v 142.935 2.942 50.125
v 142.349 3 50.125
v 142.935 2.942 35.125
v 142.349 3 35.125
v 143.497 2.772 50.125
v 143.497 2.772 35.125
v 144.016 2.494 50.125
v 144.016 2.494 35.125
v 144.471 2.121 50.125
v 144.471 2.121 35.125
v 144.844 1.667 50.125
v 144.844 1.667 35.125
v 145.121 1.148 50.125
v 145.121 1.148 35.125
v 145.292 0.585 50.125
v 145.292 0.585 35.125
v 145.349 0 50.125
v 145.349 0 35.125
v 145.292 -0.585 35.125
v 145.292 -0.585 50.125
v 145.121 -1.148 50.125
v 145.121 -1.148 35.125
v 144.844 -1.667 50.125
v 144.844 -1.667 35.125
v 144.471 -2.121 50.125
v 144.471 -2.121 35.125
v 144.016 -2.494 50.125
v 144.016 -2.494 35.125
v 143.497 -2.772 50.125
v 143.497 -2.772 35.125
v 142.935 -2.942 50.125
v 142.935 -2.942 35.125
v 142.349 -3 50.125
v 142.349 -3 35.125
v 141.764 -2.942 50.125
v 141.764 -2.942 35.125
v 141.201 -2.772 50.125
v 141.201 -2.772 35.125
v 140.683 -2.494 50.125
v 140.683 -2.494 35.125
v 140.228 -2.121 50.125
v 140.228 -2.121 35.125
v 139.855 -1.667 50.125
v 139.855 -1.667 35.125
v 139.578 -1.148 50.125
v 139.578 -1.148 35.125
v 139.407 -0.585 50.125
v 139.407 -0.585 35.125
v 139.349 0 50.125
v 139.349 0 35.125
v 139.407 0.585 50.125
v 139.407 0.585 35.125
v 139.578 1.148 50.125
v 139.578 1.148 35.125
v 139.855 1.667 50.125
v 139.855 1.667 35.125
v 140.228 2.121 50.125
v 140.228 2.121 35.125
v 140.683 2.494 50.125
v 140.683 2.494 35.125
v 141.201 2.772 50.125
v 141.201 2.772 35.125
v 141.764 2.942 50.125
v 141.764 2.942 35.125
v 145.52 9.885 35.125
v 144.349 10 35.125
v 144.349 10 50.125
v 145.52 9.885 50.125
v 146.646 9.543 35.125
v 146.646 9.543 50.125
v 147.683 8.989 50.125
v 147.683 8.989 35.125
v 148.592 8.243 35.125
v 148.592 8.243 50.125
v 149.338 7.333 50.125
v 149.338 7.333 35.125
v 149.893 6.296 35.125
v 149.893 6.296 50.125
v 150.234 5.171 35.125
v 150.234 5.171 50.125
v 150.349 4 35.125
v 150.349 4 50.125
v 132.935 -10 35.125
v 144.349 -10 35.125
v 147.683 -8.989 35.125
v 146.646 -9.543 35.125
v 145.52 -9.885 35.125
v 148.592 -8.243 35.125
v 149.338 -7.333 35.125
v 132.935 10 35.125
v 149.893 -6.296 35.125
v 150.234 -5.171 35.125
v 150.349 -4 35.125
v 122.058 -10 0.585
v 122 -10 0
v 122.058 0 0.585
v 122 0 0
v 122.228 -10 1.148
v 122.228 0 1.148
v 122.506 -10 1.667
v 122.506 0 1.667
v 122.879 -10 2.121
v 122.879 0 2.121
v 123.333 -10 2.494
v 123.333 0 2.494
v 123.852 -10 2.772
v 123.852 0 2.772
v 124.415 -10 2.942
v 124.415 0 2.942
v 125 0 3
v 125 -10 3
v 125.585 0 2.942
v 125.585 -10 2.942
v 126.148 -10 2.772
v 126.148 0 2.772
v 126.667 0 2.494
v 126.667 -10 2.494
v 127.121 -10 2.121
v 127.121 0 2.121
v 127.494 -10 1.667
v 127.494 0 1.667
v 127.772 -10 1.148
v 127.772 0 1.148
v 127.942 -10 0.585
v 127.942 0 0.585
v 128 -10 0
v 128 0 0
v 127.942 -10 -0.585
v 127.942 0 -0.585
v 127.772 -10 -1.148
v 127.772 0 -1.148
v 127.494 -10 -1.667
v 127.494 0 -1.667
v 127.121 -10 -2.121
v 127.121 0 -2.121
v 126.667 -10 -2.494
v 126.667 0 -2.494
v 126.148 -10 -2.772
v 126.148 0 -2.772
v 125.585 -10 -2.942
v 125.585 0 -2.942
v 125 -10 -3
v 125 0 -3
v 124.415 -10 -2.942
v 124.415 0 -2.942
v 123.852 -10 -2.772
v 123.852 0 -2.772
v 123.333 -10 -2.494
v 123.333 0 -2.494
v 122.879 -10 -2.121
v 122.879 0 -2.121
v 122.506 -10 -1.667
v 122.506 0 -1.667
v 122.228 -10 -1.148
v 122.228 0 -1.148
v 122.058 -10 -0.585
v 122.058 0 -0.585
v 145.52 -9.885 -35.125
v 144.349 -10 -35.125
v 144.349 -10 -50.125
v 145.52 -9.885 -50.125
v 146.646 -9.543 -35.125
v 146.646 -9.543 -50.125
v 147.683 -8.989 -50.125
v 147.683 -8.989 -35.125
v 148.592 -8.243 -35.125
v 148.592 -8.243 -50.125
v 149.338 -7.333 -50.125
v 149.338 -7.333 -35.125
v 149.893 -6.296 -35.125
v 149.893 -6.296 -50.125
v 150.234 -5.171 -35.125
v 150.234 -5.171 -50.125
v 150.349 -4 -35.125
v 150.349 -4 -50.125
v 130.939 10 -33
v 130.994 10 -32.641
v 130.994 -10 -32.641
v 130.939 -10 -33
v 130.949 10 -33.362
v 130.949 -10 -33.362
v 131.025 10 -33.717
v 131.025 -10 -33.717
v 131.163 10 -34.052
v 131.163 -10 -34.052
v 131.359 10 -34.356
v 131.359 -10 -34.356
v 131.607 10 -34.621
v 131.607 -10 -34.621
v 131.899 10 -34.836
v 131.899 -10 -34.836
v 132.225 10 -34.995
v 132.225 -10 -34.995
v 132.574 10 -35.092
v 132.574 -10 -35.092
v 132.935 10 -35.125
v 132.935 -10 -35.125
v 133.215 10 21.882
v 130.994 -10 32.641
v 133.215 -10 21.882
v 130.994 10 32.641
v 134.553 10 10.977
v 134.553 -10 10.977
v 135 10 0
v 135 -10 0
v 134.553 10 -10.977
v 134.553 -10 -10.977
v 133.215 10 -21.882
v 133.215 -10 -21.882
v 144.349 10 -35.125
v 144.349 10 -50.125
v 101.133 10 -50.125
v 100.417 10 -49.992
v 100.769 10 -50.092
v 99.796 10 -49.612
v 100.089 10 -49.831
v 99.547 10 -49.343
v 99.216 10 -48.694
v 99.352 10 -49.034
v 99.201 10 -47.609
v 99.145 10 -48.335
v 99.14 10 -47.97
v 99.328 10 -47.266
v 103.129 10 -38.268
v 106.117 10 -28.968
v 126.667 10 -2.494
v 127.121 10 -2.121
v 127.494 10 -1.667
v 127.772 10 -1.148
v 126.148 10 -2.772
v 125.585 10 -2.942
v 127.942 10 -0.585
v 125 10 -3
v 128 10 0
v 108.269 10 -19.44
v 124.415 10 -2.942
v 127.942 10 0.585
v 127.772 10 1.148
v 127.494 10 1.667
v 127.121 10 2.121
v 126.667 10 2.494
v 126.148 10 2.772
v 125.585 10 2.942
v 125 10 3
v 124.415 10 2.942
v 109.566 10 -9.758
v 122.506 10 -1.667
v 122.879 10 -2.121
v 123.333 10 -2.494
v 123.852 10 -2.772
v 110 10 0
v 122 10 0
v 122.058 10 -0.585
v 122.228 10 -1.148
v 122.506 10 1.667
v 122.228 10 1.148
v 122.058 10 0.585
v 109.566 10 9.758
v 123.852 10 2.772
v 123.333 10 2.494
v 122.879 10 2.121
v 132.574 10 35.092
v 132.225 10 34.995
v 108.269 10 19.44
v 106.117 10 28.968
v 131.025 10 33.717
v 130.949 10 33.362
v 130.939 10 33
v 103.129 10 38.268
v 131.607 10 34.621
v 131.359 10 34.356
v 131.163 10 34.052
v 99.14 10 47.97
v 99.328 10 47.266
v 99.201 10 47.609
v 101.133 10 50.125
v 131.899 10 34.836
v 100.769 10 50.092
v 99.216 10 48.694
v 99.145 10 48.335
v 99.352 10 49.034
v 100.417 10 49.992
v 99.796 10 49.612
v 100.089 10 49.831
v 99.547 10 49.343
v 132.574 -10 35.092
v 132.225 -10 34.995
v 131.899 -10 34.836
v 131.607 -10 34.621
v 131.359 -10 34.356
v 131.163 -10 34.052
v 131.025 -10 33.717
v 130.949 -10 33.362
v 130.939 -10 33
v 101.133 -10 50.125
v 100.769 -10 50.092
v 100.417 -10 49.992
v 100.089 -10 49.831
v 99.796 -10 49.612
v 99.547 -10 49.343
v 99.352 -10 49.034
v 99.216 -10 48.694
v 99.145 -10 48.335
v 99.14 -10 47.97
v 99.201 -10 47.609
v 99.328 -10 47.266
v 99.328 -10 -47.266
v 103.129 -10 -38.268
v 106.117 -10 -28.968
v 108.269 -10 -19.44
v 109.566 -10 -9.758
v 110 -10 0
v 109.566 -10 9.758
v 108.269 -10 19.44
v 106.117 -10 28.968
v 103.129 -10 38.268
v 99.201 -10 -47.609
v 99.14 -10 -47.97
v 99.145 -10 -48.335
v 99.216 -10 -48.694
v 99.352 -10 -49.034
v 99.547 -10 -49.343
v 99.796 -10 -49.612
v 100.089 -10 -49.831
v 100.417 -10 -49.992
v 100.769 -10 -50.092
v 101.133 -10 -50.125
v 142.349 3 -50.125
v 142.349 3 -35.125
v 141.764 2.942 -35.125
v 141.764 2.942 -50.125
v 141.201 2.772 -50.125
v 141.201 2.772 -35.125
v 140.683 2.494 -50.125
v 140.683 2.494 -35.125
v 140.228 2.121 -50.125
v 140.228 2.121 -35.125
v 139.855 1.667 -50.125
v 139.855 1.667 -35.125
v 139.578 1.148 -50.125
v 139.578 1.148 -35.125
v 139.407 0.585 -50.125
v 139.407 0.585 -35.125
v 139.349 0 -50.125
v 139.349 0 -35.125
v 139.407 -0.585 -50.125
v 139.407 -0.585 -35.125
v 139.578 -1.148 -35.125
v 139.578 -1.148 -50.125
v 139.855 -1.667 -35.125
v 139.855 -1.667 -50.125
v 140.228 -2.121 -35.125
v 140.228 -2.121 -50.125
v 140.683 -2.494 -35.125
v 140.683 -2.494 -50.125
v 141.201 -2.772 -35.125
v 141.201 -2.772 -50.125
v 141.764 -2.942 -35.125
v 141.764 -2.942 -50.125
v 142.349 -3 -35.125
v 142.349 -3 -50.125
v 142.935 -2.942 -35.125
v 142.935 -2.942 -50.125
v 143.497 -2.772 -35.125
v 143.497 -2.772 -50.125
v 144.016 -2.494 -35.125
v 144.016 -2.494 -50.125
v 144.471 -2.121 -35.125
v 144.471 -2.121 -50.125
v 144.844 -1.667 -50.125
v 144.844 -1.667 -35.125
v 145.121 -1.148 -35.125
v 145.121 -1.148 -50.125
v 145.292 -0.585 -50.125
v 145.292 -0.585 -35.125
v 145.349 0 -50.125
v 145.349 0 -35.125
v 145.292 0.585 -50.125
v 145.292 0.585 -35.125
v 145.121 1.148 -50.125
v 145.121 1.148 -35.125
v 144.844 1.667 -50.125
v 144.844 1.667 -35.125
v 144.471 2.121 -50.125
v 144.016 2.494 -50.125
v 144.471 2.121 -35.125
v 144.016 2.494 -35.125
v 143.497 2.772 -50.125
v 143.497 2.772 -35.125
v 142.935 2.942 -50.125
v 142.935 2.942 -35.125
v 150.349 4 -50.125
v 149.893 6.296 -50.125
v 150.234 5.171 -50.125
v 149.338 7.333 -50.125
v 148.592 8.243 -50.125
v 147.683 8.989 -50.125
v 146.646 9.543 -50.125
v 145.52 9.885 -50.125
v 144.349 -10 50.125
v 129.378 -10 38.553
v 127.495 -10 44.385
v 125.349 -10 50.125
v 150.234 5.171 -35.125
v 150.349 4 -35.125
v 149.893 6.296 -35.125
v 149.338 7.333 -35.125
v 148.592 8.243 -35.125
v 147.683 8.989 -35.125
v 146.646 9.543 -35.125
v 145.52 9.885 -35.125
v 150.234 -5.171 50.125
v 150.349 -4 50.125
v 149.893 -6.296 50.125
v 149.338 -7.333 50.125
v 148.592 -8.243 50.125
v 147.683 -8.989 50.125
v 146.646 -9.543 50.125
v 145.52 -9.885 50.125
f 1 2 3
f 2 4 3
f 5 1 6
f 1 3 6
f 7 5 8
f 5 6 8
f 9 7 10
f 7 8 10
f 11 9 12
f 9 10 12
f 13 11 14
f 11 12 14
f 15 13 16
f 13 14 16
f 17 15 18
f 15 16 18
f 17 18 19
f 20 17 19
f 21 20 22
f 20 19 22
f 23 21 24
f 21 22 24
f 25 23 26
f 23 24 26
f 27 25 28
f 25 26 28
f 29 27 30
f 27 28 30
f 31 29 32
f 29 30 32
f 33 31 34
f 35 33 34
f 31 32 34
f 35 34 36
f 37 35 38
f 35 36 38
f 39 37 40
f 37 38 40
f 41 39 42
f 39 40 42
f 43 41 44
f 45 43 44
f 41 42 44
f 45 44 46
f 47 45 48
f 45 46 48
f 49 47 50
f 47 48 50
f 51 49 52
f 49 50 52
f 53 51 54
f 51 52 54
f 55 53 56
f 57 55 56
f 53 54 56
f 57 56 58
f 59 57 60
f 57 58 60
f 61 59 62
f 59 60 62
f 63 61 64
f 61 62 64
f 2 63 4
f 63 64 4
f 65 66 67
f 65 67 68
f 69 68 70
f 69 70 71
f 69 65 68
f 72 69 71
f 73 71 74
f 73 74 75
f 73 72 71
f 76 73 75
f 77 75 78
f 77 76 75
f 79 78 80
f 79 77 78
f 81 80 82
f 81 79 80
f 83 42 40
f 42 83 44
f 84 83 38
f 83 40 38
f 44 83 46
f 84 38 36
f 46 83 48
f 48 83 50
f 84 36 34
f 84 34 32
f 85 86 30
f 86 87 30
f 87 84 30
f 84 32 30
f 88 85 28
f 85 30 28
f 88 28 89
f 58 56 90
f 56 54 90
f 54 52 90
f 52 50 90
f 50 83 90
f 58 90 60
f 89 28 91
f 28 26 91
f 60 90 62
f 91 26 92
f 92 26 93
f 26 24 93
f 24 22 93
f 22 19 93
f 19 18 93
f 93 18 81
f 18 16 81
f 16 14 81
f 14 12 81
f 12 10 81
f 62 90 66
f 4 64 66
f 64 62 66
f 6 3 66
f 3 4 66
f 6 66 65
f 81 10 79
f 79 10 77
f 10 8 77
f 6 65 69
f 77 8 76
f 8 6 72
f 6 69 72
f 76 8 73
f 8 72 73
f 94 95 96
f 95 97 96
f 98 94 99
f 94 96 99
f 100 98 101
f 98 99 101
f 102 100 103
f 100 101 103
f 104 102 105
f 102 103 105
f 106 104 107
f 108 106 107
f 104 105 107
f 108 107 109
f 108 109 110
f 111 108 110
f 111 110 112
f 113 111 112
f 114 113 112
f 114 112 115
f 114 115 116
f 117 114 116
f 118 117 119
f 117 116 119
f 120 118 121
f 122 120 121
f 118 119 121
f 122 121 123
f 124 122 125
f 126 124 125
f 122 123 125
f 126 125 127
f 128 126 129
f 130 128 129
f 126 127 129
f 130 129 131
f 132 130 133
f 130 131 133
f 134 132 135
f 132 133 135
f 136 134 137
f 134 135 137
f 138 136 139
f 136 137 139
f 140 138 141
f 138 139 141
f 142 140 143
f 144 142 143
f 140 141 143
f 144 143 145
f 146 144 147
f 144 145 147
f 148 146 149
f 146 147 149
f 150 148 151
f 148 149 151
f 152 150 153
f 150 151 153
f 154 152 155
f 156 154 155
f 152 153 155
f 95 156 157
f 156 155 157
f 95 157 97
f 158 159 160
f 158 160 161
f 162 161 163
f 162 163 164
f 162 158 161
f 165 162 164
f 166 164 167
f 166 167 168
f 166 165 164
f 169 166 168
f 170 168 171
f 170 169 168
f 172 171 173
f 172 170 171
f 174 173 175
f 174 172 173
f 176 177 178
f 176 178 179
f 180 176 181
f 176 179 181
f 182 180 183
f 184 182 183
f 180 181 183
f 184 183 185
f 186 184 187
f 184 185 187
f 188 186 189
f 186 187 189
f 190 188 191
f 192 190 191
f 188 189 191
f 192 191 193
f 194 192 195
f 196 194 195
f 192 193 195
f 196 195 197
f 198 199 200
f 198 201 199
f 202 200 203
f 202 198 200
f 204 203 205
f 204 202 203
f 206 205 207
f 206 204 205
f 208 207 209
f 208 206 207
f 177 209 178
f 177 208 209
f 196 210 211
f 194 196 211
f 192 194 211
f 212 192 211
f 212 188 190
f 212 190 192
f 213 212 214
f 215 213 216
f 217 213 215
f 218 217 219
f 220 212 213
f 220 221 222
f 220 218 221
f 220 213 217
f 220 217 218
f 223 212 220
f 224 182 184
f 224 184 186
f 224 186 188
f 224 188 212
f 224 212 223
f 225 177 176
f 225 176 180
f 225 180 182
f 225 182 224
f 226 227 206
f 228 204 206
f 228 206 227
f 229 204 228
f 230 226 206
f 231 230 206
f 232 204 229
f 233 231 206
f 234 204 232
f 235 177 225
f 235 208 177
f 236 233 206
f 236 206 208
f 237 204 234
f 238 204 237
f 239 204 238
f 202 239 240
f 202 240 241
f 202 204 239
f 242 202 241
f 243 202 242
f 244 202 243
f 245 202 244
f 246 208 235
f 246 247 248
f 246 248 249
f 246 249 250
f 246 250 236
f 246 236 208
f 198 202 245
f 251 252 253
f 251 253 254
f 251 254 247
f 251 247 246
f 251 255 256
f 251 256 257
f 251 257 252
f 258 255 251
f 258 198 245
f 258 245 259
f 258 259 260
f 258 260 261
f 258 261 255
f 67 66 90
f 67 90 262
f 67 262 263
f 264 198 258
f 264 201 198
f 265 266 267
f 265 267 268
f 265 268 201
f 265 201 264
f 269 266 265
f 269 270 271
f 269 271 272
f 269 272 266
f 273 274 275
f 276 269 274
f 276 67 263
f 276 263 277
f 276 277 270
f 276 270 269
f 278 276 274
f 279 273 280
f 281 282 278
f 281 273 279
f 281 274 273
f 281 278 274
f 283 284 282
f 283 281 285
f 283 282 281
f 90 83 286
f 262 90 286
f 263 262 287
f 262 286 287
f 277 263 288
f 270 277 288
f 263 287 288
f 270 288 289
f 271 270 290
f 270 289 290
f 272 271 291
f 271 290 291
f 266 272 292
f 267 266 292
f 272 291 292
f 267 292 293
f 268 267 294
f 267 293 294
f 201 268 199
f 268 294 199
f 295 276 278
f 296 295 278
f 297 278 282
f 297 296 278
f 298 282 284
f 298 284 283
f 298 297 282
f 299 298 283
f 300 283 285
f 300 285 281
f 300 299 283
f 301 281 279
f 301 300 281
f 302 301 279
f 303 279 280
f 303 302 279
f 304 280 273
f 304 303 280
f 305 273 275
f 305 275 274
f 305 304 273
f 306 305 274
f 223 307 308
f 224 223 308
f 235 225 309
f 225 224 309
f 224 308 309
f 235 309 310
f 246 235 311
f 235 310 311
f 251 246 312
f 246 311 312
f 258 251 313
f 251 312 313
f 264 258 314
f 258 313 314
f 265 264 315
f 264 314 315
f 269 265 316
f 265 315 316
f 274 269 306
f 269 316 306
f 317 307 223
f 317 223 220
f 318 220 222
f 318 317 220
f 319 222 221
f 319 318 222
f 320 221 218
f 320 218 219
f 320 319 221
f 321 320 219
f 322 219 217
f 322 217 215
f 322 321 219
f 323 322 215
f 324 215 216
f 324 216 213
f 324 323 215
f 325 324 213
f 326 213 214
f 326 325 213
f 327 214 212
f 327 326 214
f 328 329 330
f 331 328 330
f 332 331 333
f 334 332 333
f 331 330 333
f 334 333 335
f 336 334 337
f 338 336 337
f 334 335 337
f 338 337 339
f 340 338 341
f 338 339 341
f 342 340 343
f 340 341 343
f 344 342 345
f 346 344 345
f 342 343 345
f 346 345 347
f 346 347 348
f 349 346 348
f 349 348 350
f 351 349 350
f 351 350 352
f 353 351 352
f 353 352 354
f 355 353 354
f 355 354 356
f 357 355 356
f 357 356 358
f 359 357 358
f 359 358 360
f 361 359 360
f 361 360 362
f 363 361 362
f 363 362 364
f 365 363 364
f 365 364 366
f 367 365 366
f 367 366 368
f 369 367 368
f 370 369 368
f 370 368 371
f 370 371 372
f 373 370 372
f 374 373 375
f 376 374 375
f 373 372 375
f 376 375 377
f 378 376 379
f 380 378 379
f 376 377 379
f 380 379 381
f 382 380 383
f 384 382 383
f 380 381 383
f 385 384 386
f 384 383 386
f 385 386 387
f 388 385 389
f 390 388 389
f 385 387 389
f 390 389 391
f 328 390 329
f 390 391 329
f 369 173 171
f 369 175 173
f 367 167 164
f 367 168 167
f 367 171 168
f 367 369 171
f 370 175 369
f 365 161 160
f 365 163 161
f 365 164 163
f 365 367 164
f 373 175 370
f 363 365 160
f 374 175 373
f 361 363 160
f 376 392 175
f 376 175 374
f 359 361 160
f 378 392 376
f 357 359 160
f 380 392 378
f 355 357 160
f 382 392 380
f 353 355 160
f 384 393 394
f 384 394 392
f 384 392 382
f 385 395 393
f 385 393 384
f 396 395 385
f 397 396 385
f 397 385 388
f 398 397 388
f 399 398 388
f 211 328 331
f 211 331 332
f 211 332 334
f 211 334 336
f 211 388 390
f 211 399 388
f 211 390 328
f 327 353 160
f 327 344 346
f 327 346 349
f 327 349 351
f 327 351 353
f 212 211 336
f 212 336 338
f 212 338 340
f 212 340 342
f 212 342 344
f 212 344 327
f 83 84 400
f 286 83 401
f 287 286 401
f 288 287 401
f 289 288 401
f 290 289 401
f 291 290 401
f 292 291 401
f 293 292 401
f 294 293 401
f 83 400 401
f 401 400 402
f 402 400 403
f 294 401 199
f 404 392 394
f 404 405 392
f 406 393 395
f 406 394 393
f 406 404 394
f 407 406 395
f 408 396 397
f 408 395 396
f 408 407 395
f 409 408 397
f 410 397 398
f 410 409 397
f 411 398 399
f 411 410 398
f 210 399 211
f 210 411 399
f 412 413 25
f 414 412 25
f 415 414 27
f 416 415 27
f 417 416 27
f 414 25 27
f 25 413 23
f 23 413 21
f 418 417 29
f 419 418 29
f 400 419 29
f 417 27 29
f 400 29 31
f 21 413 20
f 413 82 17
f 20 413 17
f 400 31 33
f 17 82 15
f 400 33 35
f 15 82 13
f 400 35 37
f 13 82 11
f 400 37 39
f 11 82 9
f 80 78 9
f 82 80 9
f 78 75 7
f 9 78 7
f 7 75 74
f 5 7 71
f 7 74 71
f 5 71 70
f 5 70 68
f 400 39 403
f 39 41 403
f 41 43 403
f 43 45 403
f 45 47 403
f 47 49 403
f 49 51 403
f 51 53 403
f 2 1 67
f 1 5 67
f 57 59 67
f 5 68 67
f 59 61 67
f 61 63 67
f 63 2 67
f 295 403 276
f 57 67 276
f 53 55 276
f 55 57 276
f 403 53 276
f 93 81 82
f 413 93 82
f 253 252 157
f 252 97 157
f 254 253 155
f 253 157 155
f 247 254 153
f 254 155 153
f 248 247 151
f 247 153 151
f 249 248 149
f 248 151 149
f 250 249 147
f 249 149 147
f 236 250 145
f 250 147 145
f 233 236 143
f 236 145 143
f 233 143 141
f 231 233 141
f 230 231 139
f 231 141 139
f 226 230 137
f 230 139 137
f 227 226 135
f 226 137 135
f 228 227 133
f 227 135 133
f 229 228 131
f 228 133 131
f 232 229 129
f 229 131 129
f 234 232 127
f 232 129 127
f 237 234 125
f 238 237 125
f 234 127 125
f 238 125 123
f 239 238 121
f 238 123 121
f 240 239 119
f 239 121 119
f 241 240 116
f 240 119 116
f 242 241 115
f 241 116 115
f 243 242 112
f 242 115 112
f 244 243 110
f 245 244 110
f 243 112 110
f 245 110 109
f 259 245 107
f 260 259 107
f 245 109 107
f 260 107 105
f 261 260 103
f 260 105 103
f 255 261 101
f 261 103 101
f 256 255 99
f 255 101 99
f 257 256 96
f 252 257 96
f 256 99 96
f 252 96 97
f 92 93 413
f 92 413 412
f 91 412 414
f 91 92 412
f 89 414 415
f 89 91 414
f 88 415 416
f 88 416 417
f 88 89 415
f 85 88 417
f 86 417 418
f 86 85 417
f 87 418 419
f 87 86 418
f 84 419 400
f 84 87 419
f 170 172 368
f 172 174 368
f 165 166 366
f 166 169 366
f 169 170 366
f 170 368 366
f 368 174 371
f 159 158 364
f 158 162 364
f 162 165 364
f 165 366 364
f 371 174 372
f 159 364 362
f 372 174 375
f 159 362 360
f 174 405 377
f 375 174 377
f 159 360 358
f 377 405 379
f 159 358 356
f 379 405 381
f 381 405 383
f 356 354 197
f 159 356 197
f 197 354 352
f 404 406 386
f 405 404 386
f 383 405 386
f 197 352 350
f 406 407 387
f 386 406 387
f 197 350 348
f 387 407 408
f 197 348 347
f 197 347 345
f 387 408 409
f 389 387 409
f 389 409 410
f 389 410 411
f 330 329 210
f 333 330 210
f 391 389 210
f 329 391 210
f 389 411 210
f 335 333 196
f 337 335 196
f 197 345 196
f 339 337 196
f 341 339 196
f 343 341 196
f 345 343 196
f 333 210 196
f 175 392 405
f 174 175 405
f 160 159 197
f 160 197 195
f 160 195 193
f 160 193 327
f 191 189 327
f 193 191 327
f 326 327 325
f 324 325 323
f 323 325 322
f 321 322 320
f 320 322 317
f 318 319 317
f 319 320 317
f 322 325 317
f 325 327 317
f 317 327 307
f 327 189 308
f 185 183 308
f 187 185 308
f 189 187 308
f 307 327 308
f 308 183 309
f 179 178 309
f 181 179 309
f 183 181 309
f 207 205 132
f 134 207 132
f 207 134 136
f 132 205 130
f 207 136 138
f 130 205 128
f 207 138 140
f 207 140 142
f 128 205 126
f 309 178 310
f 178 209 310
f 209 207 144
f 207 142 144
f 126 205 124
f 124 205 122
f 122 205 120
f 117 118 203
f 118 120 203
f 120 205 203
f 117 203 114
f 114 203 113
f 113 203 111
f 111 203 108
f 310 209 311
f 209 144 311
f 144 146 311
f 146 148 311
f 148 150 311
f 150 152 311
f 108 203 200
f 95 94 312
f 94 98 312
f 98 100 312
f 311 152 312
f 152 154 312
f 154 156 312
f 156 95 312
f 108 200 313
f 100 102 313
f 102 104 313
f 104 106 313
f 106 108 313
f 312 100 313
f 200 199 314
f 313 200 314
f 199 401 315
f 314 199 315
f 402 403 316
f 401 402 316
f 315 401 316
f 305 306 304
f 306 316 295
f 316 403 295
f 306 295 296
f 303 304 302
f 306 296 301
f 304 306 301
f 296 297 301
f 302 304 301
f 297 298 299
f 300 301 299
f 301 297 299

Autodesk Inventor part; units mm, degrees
ref_plane "YZ Plane" through (0, 0, 0) normal (1, 0, 0) x (0, 1, 0)
ref_plane "XZ Plane" through (0, 0, 0) normal (0, 1, 0) x (-1, 0, 0)
ref_plane "XY Plane" through (0, 0, 0) normal (0, 0, 1) x (1, 0, 0)
sketch "Sketch1" plane through (0, 0, 0) normal (0, 1, 0) x (-1, 0, 0)
  circle A0 centre (0, 0) radius 135
  circle A1 centre (0, 0) radius 110
  circle A2 centre (0, 0) radius 125
  circle A3 centre (-125, 0) radius 3
  circle A4 centre (-101.1271, -73.4732) radius 3
  circle A5 centre (-38.6271, -118.8821) radius 3
  circle A6 centre (38.6271, -118.8821) radius 3
  circle A7 centre (101.1271, -73.4732) radius 3
  circle A8 centre (125, 0) radius 3
  circle A9 centre (101.1271, 73.4732) radius 3
  circle A10 centre (38.6271, 118.8821) radius 3
  circle A11 centre (-38.6271, 118.8821) radius 3
  circle A12 centre (-101.1271, 73.4732) radius 3
  dimension "d68" = 250
  dimension "d0" = 270
  dimension "d1" = 220
  dimension "d74" = 6
  dimension "d77" = 360
extrude "Extrusion1" add sketch "Sketch1" along normal mid plane 20 contours A0 | A8 A2 A7 A6 A5 A4 A3 A12 A11 A10 A9
sketch "Sketch4" plane through (0, 10, 0) normal (0, 1, 0) x (1, 0, 0)
  circle A0 centre (0, 0) radius 50.125
  circle A1 centre (0, 0) radius 135 projected
  circle A2 centre (0, 0) radius 110 projected
  line L0 (125.3494, 50.125) -> (150.3494, 50.125)
  line L1 (150.3494, 50.125) -> (150.3494, 35.125)
  line L2 (150.3494, 35.125) -> (125.3494, 35.125)
  line L3 (125.3494, 35.125) -> (125.3494, 50.125)
  line L4 (150.3494, 70.125) -> (104.7795, 70.125)
  line L5 (104.7795, 70.125) -> (104.7795, 85.125)
  line L6 (104.7795, 85.125) -> (150.3494, 85.125)
  line L7 (150.3494, 85.125) -> (150.3494, 70.125)
  line L8 (103.1497, 60.125) -> (138.3886, 60.125) construction
  point P0 (130.3504, 35.125)
  point P1 (115.3581, 70.125)
  dimension "d21" = 100.25
  dimension "d22" = 25
  dimension "d23" = 15
  dimension "d24" = 20
  dimension "d25" = 15
  dimension "d57" = 10
extrude "Extrusion3" add sketch "Sketch4" against normal up to surface (20 mm away) contours L6 L7 L4 A1 | A1 L0 L1 L2
fillet "Fillet1" radius 6 4 edges at (150.3494, 10, -77.625) (150.3494, -10, -77.625) (150.3494, -10, -42.625) (150.3494, 10, -42.625)
fillet "Fillet2" radius 10 1 edges at (104.7795, 0, -85.125)
fillet "Fillet3" radius 2 1 edges at (130.3504, 0, -35.125)
sketch "Sketch5" plane through (150.3494, -4, -85.125) normal (0, 0, -1) x (-1, 0, 0)
  line L0 (0, 8) -> (0, 0) projected
  line L1 (40.9135, -6) -> (6, -6) projected
  point P0 (150.3494, 4)
  point P1 (8, 4)
  point P2 (0, 4)
  dimension "d38" = 8
  dimension "d39" = 10
hole "Hole2" at (142.3494, 0, -85.125) direction (0, 0, 1) diameter 6 depth 50 counterbore diameter 8.8 counterbore depth 5
mirror "Mirror1" about plane through (0, 0, 0) normal (1, 0, 0) of "Extrusion3", "Fillet1", "Fillet2", "Fillet3", "Hole2"
mirror "Mirror2" about plane through (0, 0, 0) normal (0, 0, 1) of "Extrusion3", "Fillet1", "Fillet2", "Fillet3", "Hole2"
sketch "Sketch7" plane through (0, 10, 0) normal (0, 1, 0) x (1, 0, 0)
  line L0 (0, 0) -> (0, -158.0698) construction
  point P0 (0, -127.5)
  dimension "d50" = 127.5
hole "Hole3" at (0, 10, 127.5) direction (0, -1, 0) diameter 5 end through all
sketch "Sketch10" plane through (0, 10, 0) normal (0, 1, 0) x (1, 0, 0)
  line L0 (144.3494, 50.125) -> (125.3494, 50.125) projected
  line L1 (144.3494, -50.125) -> (125.3494, -50.125) projected
  line L2 (174.7146, 50.125) -> (75.699, 50.125)
  line L3 (75.699, 50.125) -> (75.699, -50.125)
  line L4 (75.699, -50.125) -> (174.7146, -50.125)
  line L5 (174.7146, 145.3293) -> (-157.7861, 145.3293)
  line L6 (-157.7861, 145.3293) -> (-157.7861, -141.1771)
  line L7 (-157.7861, -141.1771) -> (174.7146, -141.1771)
  line L8 (174.7146, -141.1771) -> (174.7146, -50.125)
  line L9 (174.7146, 50.125) -> (174.7146, 145.3293)
  point P0 (0, 0)
extrude "Extrusion7" cut sketch "Sketch10" against normal through all
fillet "Fillet7" radius 2 2 edges at (97.9157, 0, -50.125) (97.9157, 0, 50.125)
properties part number "Cylinder 80-20 Spacer_1"
